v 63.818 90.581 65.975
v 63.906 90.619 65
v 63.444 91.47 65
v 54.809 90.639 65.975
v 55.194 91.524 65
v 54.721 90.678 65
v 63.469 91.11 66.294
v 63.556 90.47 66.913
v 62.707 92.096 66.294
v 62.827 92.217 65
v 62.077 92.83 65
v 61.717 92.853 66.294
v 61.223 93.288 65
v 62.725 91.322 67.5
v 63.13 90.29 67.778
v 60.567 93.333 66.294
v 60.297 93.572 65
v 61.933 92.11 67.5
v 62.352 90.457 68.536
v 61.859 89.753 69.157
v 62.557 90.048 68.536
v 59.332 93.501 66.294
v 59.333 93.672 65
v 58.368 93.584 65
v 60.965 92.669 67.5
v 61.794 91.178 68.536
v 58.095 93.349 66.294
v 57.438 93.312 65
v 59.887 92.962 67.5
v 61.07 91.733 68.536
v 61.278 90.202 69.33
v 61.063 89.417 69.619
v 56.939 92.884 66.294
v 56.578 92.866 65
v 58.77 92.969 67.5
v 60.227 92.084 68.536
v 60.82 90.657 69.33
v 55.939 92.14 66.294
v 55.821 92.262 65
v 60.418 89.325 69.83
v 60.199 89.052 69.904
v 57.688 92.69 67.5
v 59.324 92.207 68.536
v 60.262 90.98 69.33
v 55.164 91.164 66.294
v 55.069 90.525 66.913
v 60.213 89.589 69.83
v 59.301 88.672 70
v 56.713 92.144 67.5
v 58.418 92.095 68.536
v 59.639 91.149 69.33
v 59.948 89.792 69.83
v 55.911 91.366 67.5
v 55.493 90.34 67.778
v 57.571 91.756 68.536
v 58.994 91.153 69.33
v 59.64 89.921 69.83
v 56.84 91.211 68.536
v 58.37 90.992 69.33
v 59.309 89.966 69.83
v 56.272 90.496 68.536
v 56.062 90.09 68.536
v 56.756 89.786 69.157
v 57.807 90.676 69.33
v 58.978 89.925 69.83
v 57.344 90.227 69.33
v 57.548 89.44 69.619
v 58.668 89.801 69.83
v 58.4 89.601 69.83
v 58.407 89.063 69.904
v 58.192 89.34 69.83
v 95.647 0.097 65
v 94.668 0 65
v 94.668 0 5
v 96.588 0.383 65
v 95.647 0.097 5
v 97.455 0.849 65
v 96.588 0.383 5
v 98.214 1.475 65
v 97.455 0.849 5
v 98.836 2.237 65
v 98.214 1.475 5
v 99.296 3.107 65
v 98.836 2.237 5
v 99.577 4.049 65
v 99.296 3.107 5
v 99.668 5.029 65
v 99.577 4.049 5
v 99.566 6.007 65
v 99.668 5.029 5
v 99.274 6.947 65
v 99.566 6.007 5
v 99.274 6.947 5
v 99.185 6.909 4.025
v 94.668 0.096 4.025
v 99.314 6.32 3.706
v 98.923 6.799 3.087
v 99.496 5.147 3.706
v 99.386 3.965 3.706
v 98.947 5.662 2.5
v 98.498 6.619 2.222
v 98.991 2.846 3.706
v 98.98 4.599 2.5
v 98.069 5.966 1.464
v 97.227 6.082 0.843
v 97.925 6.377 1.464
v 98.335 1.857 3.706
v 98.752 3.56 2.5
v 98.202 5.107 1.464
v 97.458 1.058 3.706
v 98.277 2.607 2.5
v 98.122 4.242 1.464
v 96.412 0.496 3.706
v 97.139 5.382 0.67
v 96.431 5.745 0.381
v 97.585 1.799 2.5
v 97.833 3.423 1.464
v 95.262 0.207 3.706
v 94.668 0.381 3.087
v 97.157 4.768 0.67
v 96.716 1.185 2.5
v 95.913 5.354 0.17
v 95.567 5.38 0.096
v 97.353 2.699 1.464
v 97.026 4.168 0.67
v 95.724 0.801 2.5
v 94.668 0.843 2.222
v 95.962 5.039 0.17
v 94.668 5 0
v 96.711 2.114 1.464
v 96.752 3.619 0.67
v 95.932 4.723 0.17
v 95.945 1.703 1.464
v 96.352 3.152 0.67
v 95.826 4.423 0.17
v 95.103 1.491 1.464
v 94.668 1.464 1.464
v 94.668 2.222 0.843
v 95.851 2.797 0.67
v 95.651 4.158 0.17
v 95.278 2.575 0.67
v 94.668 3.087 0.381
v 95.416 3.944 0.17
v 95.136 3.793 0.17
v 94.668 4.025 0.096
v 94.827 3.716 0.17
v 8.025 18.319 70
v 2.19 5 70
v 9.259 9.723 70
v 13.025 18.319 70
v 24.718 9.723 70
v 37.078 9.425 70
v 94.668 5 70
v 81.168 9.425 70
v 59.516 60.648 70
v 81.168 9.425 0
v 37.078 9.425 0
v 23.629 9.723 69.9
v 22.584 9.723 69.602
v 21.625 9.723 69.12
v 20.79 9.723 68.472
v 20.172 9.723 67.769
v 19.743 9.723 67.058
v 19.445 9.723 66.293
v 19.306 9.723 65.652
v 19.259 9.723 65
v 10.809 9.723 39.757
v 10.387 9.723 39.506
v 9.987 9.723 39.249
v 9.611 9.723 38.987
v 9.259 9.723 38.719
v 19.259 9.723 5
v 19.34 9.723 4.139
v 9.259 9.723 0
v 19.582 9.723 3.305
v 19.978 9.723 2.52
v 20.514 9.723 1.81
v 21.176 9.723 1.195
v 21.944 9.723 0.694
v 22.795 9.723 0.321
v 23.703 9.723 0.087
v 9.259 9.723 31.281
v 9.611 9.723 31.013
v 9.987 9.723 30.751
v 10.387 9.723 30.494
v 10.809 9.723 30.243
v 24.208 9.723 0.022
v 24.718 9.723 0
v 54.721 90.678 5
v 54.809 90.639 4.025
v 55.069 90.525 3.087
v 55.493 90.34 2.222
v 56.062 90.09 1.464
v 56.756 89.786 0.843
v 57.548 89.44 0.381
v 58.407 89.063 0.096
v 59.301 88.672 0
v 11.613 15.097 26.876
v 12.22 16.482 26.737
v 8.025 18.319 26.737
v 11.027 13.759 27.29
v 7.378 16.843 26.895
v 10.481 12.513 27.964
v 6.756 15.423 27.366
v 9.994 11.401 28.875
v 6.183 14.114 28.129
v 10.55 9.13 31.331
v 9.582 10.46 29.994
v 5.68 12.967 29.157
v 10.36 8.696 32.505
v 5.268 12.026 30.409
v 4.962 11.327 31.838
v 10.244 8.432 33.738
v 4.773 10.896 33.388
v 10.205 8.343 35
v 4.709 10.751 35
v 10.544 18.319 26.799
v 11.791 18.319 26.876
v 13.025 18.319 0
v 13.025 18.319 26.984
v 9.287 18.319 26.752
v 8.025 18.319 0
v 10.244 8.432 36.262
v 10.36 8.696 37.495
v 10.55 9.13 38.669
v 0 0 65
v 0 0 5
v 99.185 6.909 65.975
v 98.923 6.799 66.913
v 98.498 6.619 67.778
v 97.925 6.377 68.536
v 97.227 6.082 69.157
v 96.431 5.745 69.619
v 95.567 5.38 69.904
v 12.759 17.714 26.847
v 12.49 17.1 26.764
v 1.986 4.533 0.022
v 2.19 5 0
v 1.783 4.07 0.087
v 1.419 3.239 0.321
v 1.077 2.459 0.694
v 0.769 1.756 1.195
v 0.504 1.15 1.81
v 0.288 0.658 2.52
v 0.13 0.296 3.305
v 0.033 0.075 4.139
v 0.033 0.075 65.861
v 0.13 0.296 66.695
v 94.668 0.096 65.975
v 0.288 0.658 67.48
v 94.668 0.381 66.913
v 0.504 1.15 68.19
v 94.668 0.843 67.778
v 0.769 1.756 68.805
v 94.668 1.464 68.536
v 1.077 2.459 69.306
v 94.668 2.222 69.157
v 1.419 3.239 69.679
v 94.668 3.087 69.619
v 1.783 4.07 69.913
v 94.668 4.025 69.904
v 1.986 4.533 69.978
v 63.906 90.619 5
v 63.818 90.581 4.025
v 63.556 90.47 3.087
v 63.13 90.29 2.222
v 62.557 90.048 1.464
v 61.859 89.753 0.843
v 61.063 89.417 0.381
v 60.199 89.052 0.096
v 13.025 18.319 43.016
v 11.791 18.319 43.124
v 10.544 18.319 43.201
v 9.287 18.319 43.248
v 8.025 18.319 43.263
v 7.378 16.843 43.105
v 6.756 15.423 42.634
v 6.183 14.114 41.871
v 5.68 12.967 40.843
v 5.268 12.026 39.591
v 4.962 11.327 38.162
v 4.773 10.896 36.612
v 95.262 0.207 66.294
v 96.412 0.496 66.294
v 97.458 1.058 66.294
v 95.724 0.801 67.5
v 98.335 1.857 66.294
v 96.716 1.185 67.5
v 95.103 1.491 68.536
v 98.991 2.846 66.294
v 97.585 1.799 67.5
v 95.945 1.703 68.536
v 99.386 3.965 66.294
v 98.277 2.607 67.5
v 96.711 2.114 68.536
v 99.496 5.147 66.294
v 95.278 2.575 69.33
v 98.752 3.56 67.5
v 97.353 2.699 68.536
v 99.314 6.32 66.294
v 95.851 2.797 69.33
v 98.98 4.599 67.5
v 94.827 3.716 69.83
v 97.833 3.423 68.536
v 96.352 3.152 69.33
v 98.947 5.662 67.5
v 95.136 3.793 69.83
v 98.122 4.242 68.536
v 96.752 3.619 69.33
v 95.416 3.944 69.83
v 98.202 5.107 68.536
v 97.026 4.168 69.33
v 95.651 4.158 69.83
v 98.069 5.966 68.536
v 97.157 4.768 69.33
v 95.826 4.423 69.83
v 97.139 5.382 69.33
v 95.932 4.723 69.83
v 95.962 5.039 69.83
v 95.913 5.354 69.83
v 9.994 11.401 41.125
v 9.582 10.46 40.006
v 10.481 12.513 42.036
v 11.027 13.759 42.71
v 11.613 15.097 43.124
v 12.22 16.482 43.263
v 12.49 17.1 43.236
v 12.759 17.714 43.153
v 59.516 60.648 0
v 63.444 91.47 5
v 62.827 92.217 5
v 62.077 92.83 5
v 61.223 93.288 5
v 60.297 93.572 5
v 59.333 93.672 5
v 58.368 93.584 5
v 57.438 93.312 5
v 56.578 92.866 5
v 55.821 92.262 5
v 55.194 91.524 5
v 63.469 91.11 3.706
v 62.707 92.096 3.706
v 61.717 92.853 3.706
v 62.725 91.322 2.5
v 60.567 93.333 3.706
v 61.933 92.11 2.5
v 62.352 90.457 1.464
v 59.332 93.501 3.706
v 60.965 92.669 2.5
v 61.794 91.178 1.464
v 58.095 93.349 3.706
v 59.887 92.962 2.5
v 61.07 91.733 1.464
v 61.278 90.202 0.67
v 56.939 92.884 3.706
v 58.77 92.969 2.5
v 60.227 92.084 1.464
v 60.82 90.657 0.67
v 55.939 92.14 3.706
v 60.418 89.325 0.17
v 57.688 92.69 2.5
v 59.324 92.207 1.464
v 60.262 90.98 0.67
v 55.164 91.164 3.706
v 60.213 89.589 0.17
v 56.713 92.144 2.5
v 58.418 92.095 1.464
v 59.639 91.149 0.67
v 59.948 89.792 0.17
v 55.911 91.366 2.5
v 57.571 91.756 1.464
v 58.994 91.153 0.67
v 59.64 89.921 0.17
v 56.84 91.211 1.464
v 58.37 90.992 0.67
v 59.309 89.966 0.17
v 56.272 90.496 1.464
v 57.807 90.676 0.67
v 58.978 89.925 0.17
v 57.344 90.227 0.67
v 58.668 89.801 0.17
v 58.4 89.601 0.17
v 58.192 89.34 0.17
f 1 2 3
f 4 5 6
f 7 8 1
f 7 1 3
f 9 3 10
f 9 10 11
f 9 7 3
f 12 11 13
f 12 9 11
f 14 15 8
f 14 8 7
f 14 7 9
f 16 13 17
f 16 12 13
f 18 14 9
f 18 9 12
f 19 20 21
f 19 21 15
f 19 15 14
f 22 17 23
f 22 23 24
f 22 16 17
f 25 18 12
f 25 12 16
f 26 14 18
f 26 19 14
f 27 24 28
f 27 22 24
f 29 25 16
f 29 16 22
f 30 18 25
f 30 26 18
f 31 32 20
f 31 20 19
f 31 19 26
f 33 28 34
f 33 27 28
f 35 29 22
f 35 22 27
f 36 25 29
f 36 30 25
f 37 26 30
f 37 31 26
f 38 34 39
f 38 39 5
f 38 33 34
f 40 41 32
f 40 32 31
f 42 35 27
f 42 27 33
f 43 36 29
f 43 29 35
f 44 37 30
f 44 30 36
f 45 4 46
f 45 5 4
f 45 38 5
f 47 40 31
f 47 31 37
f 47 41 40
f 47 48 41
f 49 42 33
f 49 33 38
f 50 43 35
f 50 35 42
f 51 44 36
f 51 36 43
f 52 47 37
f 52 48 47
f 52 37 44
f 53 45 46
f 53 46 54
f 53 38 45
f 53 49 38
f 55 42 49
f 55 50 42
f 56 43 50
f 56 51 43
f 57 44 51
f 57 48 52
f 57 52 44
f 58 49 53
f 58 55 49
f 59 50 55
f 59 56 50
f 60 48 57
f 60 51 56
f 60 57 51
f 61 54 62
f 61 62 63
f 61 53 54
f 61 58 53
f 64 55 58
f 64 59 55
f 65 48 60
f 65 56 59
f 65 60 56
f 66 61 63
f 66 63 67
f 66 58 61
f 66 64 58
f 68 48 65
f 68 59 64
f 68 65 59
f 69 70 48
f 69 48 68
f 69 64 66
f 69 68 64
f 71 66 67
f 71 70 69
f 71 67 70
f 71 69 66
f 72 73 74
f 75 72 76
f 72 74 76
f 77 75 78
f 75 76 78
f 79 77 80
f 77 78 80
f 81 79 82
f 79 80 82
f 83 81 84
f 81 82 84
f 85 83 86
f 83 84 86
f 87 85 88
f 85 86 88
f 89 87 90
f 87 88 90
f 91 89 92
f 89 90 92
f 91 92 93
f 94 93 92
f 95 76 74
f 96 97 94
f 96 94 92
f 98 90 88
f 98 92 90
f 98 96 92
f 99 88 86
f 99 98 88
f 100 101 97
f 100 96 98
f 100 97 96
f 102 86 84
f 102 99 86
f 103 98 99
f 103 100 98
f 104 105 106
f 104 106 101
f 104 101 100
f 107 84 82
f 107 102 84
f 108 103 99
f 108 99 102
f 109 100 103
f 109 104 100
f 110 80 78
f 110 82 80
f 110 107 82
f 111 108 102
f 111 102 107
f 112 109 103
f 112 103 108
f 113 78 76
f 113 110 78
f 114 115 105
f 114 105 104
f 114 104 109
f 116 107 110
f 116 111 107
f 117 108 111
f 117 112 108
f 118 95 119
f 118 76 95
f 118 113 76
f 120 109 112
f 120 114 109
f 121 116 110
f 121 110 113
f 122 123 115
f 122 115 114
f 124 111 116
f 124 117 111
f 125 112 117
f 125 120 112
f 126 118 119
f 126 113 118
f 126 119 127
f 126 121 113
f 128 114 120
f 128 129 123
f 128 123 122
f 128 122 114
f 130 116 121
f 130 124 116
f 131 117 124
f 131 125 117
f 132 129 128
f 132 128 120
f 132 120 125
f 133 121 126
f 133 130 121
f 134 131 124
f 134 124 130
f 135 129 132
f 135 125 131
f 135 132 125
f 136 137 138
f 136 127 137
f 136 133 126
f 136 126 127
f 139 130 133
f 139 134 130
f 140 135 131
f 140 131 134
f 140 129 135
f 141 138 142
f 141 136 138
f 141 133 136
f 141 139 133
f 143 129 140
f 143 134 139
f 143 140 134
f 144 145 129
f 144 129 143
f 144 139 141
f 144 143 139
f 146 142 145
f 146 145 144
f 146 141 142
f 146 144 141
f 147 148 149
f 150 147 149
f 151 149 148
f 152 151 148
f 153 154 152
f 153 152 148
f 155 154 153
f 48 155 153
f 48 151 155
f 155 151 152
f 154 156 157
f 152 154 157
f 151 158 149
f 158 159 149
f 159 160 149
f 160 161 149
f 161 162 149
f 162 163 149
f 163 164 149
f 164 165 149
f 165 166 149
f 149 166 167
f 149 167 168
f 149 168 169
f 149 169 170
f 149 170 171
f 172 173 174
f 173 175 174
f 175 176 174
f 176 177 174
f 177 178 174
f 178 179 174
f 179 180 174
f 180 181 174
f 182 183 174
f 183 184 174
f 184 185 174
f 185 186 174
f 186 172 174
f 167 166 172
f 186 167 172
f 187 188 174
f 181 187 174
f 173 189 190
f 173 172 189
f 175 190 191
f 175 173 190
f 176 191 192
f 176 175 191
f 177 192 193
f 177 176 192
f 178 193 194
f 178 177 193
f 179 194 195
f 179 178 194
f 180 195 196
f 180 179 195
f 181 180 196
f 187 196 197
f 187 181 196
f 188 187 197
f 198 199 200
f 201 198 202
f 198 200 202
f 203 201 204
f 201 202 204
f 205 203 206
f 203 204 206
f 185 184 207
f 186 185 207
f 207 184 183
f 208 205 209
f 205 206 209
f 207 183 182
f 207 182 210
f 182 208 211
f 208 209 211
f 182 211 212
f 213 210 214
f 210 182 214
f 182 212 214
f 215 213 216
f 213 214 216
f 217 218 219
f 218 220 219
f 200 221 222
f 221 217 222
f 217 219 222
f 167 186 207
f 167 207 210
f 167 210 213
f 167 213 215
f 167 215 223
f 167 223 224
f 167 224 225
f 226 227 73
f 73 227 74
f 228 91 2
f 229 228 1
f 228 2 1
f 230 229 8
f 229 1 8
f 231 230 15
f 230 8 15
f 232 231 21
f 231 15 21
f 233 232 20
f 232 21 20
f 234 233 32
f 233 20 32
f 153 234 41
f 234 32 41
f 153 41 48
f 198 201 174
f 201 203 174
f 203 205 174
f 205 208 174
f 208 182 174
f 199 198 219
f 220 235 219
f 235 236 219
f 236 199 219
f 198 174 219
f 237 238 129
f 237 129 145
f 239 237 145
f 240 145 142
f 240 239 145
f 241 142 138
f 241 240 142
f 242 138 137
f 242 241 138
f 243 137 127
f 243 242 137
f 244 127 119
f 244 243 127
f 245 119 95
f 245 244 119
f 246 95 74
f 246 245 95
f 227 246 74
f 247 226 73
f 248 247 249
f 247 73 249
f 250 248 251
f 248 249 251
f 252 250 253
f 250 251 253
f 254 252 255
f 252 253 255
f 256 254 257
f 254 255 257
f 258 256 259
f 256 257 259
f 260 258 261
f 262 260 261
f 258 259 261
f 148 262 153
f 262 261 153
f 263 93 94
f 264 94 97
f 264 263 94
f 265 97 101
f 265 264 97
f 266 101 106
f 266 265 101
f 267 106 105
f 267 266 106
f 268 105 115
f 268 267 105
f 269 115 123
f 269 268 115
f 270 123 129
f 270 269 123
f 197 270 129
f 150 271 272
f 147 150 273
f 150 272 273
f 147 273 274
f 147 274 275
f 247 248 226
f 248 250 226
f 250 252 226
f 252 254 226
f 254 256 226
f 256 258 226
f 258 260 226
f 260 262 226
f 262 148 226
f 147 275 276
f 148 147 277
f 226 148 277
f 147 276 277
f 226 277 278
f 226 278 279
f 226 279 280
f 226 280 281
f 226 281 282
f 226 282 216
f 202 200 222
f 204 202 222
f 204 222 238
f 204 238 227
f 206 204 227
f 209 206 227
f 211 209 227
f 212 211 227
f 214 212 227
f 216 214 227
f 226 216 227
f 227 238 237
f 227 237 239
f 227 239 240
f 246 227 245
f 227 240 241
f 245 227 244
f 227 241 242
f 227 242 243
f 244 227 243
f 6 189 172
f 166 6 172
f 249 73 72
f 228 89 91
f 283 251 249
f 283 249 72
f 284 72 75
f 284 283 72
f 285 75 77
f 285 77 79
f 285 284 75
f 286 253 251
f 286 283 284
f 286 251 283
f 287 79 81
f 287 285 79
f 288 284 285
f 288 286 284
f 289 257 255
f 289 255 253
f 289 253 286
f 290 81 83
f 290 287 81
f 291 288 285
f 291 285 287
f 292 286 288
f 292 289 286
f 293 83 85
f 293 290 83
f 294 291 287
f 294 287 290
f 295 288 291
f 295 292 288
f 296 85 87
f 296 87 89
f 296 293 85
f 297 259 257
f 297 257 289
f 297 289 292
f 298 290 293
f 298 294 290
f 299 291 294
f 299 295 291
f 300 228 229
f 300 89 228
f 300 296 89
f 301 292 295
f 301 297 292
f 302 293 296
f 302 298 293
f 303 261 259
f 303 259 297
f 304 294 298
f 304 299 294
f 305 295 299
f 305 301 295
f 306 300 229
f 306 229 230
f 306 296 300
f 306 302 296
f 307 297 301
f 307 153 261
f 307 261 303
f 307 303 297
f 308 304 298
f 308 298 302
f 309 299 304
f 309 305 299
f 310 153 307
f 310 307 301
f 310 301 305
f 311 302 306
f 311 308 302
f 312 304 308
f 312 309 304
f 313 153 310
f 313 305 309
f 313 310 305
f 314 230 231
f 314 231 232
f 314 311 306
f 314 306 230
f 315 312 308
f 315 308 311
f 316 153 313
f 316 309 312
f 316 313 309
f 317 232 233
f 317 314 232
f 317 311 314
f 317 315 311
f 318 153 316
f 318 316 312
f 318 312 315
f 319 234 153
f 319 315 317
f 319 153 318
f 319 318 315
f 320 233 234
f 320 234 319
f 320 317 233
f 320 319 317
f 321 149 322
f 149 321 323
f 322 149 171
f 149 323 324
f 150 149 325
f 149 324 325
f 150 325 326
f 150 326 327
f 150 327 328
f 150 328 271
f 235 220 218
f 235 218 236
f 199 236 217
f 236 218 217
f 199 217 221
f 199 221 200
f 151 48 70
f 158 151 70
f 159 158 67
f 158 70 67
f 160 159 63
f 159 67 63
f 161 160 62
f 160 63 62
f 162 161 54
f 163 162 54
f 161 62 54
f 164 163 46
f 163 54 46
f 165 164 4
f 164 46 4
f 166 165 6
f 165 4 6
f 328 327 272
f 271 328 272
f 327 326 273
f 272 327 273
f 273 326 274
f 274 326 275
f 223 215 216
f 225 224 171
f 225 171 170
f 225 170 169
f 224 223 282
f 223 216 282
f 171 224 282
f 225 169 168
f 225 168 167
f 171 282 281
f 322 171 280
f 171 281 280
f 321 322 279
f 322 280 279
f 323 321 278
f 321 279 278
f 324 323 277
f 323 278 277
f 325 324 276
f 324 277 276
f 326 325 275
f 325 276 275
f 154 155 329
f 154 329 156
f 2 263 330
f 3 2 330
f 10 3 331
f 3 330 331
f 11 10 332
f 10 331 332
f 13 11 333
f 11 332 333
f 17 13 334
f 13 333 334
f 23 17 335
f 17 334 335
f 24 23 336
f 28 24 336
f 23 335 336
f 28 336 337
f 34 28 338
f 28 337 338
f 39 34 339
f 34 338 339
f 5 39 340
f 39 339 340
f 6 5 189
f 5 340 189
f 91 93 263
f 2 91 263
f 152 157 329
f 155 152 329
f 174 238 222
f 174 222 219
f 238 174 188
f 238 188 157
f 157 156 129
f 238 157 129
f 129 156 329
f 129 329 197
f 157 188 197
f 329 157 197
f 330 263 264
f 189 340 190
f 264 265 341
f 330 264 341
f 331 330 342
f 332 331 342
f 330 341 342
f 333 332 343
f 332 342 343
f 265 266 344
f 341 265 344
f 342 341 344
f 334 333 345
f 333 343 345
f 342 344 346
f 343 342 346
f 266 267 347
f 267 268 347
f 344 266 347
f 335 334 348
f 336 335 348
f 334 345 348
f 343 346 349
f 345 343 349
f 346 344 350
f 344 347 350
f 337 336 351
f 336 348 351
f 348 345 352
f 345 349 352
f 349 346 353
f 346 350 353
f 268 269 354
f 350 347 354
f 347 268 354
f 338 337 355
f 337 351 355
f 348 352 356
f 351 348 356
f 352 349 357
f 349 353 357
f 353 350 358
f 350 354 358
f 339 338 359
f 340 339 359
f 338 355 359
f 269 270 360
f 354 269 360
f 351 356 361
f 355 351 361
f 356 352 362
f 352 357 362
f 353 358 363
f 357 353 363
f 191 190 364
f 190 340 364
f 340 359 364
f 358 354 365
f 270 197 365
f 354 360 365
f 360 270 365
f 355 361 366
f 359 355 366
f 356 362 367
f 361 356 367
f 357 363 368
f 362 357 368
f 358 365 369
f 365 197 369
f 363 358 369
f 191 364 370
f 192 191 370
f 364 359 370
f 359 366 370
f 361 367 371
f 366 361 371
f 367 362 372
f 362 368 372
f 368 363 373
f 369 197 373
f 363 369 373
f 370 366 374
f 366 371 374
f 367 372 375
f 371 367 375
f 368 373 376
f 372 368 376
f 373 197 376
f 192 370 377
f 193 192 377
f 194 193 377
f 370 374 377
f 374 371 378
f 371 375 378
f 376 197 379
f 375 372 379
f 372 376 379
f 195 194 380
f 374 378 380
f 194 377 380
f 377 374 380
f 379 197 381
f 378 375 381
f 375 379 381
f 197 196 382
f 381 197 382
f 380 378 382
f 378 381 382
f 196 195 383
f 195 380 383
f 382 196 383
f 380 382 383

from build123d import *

# Parameters (mm, degrees)
F1_DEPTH     = 70
F2_R         = 5
F3_T1_DEPTH  = 94.0463660375
F3_T6_DEPTH  = 5
F3_T12_DEPTH = 100.881453585
F4_R         = 5
F5_T1_DEPTH  = 107.1682211358
F5_T3_DEPTH  = 60
F5_T8_DEPTH  = 5
F5_T14_DEPTH = 5
F7_DEPTH     = 6
F9_DEPTH     = 70.001


# Not quite as in the source:
# - a fillet or chamfer that OpenCascade refuses, or shapes differently, is made with other operations: its cross-section is extruded or revolved along the edge and cut away or added


with BuildPart() as f1:
    # F0 (on Top) → F1 (new body)
    with BuildSketch(Plane.XY):
        Polygon((8.0247101811, 18.3194985333), (0, 0), (102.2100174067, 0), (59.3825617324, 101.3203288608), (19.2590108271, 9.7228361946), (9.2590108271, 9.7228361946), (13.0247101811, 18.3194985333), align=None)
    extrude(amount=F1_DEPTH)

    # F2
    f2_edges = [f1.edges().sort_by_distance(p)[0] for p in [
        (80.79629, 50.660164, 70),
        (51.105009, 0, 70),
    ]]
    fillet(f2_edges, radius=F2_R)

    # F3: fillet of radius 5 on 2 edges, made by hand

    # F3_s2 → F3_t1 (cut)
    with BuildSketch(Plane.XY.offset(-29.0463660375)):
        with BuildLine():
            ThreePointArc((63.9061324741, 90.6185566458), (59.3330372536, 93.6717493047), (54.7207883471, 90.6780316604))
            Line((54.7207883471, 90.6780316604), (59.3825617324, 101.3203288608))
            Line((59.3825617324, 101.3203288608), (63.9061324741, 90.6185566458))
        make_face()
    extrude(amount=F3_T1_DEPTH, mode=Mode.SUBTRACT)


with BuildPart() as f3_tool4:
    # F3_s5 → F3_t6 (new body)
    with BuildSketch(Plane.XY.offset(65)):
        Polygon((59.3006629805, 88.6718541152), (63.9061324741, 90.6185566458), (59.3825617324, 101.3203288608), (54.7207883471, 90.6780316604), align=None)
    extrude(amount=F3_T6_DEPTH)

    # F3_s7 → F3_t8 (revolve, cut)
    with BuildSketch(Plane(origin=(59.3006629805, 88.6718541152, 65), x_dir=(-0.0064748546, -0.9999790379, 0), z_dir=(-0.9999790379, 0.0064748546, 0))):
        with BuildLine():
            ThreePointArc((0, -5), (5, 0), (0, 5))
            Line((0, 5), (0, -5))
        make_face()
    revolve(axis=Axis((59.3006629805, 88.6718541152, 65), (0, 0, 1)), mode=Mode.SUBTRACT)


with BuildPart() as f1_1:
    add(f1.part)

    # F3_t3: cut F3_tool4
    add(f3_tool4.part, mode=Mode.SUBTRACT)


with BuildPart() as f3_tool10:
    # F3_s11 → F3_t12 (new body)
    with BuildSketch(Plane(origin=(42.135637353, 96.1908566501, 0), x_dir=(0, 0, 1), z_dir=(-0.4012355091, -0.9159749267, 0))):
        with BuildLine():
            ThreePointArc((70, -18.7396238999), (68.5355339059, -15.204089994), (65, -13.7396238999))
            Line((65, -13.7396238999), (70, -13.7396238999))
            Line((70, -13.7396238999), (70, -18.7396238999))
        make_face()
    extrude(amount=F3_T12_DEPTH)

    split(bisect_by=Plane.XZ.offset(-9.7228361946), keep=Keep.BOTTOM)


with BuildPart() as f1_2:
    add(f1_1.part)

    # F3_t9: cut F3_tool10
    add(f3_tool10.part, mode=Mode.SUBTRACT)

    # F4
    f4_edges = [f1_2.edges().sort_by_distance(p)[0] for p in [
        (83.058075, 45.309278, 0),
        (36.9899, 50.200434, 0),
    ]]
    fillet(f4_edges, radius=F4_R)

    # F5: fillet of radius 5 on 1 edges, made by hand

    # F5_s2 → F5_t1 (cut)
    with BuildSketch(Plane.YZ.offset(-12.5)):
        with BuildLine():
            ThreePointArc((5, 0), (1.4644660941, 1.4644660941), (0, 5))
            Line((0, 5), (0, 0))
            Line((0, 0), (5, 0))
        make_face()
    extrude(amount=F5_T1_DEPTH, mode=Mode.SUBTRACT)

    # F5_s4 → F5_t3 (cut)
    with BuildSketch(Plane.XY.offset(5)):
        with BuildLine():
            ThreePointArc((94.6682211358, 0), (98.8355651733, 2.2371674547), (99.2736906295, 6.9467025307))
            Line((99.2736906295, 6.9467025307), (102.2100174067, 0))
            Line((102.2100174067, 0), (94.6682211358, 0))
        make_face()
    extrude(amount=F5_T3_DEPTH, mode=Mode.SUBTRACT)


with BuildPart() as f5_tool6:
    # F5_s7 → F5_t8 (new body)
    with BuildSketch(Plane.XY.offset(65)):
        Polygon((94.6682211358, 5), (94.6682211358, 0), (102.2100174067, 0), (99.2736906295, 6.9467025307), align=None)
    extrude(amount=F5_T8_DEPTH)

    # F5_s9 → F5_t10 (revolve, cut)
    with BuildSketch(Plane(origin=(94.6682211358, 5, 65), x_dir=(-0.8334688075, 0.5525665091, 0), z_dir=(0.5525665091, 0.8334688075, 0))):
        with BuildLine():
            ThreePointArc((0, -5), (5, 0), (0, 5))
            Line((0, 5), (0, -5))
        make_face()
    revolve(axis=Axis((94.6682211358, 5, 65), (0, 0, 1)), mode=Mode.SUBTRACT)


with BuildPart() as f1_3:
    add(f1_2.part)

    # F5_t5: cut F5_tool6
    add(f5_tool6.part, mode=Mode.SUBTRACT)


with BuildPart() as f5_tool12:
    # F5_s13 → F5_t14 (new body)
    with BuildSketch(Plane.XY.offset(5)):
        Polygon((94.6682211358, 5), (99.2736906295, 6.9467025307), (102.2100174067, 0), (94.6682211358, 0), align=None)
    extrude(amount=-F5_T14_DEPTH)

    # F5_s15 → F5_t16 (revolve, cut)
    with BuildSketch(Plane(origin=(94.6682211358, 5, 5), x_dir=(-0.8334688075, 0.5525665091, 0), z_dir=(-0.5525665091, -0.8334688075, 0))):
        with BuildLine():
            ThreePointArc((0, -5), (5, 0), (0, 5))
            Line((0, 5), (0, -5))
        make_face()
    revolve(axis=Axis((94.6682211358, 5, 5), (0, 0, -1)), mode=Mode.SUBTRACT)


with BuildPart() as f1_4:
    add(f1_3.part)

    # F5_t11: cut F5_tool12
    add(f5_tool12.part, mode=Mode.SUBTRACT)

    # F6 (on face) → F7 (cut)
    with BuildSketch(Plane(origin=(0, 0, 0), x_dir=(-0.4012355091, -0.9159749267, 0), z_dir=(-0.9159749267, 0.4012355091, 0))):
        with BuildLine():
            ThreePointArc((-20, 26.7366848613), (-14.1569538303, 29.1569538303), (-11.7366848613, 35))
            ThreePointArc((-11.7366848613, 35), (-14.1569538303, 40.8430461697), (-20, 43.2633151387))
            Line((-20, 43.2633151387), (-20, 26.7366848613))
        make_face()
        with BuildLine():
            Line((-20, 26.7366848613), (-20, 43.2633151387))
            ThreePointArc((-20, 43.2633151387), (-28.2633151387, 35), (-20, 26.7366848613))
        make_face()
    extrude(amount=-F7_DEPTH, mode=Mode.SUBTRACT)

    # F8 (on face) → F9 (cut, through all)
    with BuildSketch(Plane(origin=(0, 0, 0), x_dir=(1, 0, 0), z_dir=(0, 0, -1))):
        Polygon((81.168283108, -9.4247354642), (37.0782896005, -9.4247354642), (59.5163869294, -60.6483537421), align=None)
    extrude(amount=-F9_DEPTH, mode=Mode.SUBTRACT)


solid = f1_4.part
